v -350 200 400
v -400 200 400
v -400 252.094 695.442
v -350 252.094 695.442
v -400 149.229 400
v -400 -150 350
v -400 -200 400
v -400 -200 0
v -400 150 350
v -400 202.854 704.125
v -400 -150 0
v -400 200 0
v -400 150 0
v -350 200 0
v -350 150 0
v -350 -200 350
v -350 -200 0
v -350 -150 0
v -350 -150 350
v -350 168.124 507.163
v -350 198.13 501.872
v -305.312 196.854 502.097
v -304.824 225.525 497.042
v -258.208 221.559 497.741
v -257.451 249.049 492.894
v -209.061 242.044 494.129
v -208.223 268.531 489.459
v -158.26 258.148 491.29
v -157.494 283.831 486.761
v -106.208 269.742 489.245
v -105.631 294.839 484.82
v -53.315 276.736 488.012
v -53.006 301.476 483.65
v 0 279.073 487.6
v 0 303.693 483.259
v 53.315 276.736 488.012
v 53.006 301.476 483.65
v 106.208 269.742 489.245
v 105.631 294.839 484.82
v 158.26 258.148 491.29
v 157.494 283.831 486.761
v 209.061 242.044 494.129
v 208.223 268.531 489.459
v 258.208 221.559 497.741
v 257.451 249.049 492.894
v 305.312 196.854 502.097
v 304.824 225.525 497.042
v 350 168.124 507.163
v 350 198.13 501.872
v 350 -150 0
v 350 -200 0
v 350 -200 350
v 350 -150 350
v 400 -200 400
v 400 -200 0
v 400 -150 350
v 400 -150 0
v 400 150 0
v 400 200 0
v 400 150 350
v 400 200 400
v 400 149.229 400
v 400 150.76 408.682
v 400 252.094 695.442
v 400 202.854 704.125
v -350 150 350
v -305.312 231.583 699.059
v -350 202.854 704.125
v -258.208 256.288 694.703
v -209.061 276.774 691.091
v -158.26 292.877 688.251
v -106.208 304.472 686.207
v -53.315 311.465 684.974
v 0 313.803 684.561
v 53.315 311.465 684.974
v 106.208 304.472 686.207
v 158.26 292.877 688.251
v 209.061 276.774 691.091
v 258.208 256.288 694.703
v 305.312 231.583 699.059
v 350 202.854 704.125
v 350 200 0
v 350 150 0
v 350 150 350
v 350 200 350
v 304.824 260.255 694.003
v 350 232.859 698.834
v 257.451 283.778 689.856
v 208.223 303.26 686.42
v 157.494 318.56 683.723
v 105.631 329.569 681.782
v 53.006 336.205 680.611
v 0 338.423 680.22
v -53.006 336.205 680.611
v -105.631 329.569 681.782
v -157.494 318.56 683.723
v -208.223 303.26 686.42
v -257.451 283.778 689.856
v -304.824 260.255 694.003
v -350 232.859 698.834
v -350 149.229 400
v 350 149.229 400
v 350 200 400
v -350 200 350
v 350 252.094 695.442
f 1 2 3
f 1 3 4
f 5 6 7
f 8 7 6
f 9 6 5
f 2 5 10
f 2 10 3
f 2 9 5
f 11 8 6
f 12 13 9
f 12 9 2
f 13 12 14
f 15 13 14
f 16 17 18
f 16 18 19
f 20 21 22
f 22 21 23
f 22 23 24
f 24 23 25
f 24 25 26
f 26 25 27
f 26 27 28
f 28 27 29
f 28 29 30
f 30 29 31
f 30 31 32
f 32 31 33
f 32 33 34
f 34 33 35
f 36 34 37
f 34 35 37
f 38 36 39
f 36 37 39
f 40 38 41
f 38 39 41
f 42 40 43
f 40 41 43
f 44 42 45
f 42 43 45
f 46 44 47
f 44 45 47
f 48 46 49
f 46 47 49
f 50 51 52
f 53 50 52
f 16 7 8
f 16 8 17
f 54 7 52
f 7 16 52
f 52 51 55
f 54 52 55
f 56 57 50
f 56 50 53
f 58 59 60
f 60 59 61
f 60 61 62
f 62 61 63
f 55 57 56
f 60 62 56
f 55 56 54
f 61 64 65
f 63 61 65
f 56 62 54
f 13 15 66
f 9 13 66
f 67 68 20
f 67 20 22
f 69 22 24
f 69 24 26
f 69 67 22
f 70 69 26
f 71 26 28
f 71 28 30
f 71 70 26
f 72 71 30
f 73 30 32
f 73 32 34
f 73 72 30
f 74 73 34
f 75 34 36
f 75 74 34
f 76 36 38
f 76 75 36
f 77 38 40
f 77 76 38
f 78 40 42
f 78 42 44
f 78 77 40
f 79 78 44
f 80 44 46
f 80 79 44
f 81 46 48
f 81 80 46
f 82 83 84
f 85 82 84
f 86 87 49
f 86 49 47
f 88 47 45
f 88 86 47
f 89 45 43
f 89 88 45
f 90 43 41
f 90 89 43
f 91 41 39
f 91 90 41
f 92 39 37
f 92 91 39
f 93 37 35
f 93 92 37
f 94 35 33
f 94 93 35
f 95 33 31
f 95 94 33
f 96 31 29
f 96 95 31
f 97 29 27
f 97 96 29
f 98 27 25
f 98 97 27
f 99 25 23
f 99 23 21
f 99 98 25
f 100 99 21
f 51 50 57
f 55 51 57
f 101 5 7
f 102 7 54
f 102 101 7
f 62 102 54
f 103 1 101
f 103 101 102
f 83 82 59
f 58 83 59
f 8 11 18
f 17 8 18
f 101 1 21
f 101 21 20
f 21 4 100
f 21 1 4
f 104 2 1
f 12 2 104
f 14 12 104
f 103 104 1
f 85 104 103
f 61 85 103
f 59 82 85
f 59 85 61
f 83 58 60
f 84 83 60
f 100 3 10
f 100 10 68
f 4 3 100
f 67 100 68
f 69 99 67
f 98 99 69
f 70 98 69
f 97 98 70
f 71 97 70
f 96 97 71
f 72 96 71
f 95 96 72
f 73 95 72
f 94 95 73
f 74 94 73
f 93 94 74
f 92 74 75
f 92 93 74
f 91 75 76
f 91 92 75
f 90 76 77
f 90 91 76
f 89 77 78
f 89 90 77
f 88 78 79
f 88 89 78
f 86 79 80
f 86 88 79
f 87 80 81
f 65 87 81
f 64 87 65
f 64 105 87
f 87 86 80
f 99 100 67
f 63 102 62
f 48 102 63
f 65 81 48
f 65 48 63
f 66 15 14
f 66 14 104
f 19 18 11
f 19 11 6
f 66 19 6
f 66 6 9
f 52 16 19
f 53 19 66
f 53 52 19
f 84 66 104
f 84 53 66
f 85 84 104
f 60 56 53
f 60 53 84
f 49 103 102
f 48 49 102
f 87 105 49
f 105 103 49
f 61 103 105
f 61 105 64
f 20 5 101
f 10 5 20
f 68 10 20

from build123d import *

# Parameters (mm, degrees)
F0_W       = 800
F0_H       = 400
F1_DEPTH   = 400
F2_W       = 300
F2_H       = 350
F3_DEPTH   = 800.001
F4_W       = 700
F4_H       = 350
F5_DEPTH   = 400.001
F8_W       = 800
F8_H       = 300
F9_DEPTH   = 50
F10_W      = 700
F10_H      = 300
F11_DEPTH  = 446.7348071841
F12_DEPTH  = 8.8163490354
F11_FACE_W = 50
F11_FACE_H = 50
F15_DEPTH  = 200


with BuildPart() as f1:
    # F0 (on Top) → F1 (new body)
    with BuildSketch(Plane.XY):
        Rectangle(F0_W, F0_H)
    extrude(amount=F1_DEPTH)

    # F2 (on face) → F3 (cut, through all)
    with BuildSketch(Plane.YZ.offset(400)):
        with Locations((0, 175)):
            Rectangle(F2_W, F2_H)
    extrude(amount=-F3_DEPTH, mode=Mode.SUBTRACT)

    # F4 (on face) → F5 (cut, through all)
    with BuildSketch(Plane.XZ.offset(200)):
        with Locations((0, 175)):
            Rectangle(F4_W, F4_H)
    extrude(amount=-F5_DEPTH, mode=Mode.SUBTRACT)



with BuildPart() as f9:
    # F8 (on face) → F9 (new body)
    with BuildSketch(Plane(origin=(0, 125.5652334135, -22.1405384897), x_dir=(1, 0, 0), z_dir=(0, -0.984807753, 0.1736481777))):
        with Locations((0, 578.6527367383)):
            Rectangle(F8_W, F8_H)
    extrude(amount=F9_DEPTH)

    # F10 (on face) → F11 (cut, through all)
    with BuildSketch(Plane(origin=(0, 125.5652334135, -22.1405384897), x_dir=(-1, 0, 0), z_dir=(0, 0.984807753, -0.1736481777))):
        with Locations((0, 578.6527367383)):
            Rectangle(F10_W, F10_H)
    extrude(amount=-F11_DEPTH, mode=Mode.SUBTRACT)


with BuildPart() as f1_1:
    add(f1.part)
    # F12 (add, through all): a face of the model
    f12_faces = [f9.part.faces().sort_by_distance(p)[0] for p in [
        (-375, 175.3798061747, 404.3412044417),
    ]]

    add(f9.part)  # F12 merges F9
    extrude(f12_faces, amount=F12_DEPTH)

    # F11_face (on face) → F13 (join, up to the next surface of F1)
    with BuildSketch(Plane(origin=(-375, 175.3798061747, 404.3412044417), x_dir=(1, 0, 0), z_dir=(0, -0.1736481777, -0.984807753))):
        with Locations((750, 0)):
            Rectangle(F11_FACE_W, F11_FACE_H)
    extrude(until=Until.NEXT)

    # F14 (on face) → F15 (join)
    with BuildSketch(Plane(origin=(0, 126.5292198866, 717.5828643934), x_dir=(1, 0, 0), z_dir=(0, 0.1736481777, 0.984807753))):
        with BuildLine():
            ThreePointArc((-350, 77.5022795357), (0, 190.1625622952), (350, 77.5022795357))
            Line((350, 77.5022795357), (350, 107.9704417254))
            ThreePointArc((350, 107.9704417254), (-8.8874458979, 215.0993697449), (-364.5833333333, 97.8081010874))
            Line((-364.5833333333, 97.8081010874), (-350, 77.5022795357))
        make_face()
    extrude(amount=-F15_DEPTH)


solid = f1_1.part
